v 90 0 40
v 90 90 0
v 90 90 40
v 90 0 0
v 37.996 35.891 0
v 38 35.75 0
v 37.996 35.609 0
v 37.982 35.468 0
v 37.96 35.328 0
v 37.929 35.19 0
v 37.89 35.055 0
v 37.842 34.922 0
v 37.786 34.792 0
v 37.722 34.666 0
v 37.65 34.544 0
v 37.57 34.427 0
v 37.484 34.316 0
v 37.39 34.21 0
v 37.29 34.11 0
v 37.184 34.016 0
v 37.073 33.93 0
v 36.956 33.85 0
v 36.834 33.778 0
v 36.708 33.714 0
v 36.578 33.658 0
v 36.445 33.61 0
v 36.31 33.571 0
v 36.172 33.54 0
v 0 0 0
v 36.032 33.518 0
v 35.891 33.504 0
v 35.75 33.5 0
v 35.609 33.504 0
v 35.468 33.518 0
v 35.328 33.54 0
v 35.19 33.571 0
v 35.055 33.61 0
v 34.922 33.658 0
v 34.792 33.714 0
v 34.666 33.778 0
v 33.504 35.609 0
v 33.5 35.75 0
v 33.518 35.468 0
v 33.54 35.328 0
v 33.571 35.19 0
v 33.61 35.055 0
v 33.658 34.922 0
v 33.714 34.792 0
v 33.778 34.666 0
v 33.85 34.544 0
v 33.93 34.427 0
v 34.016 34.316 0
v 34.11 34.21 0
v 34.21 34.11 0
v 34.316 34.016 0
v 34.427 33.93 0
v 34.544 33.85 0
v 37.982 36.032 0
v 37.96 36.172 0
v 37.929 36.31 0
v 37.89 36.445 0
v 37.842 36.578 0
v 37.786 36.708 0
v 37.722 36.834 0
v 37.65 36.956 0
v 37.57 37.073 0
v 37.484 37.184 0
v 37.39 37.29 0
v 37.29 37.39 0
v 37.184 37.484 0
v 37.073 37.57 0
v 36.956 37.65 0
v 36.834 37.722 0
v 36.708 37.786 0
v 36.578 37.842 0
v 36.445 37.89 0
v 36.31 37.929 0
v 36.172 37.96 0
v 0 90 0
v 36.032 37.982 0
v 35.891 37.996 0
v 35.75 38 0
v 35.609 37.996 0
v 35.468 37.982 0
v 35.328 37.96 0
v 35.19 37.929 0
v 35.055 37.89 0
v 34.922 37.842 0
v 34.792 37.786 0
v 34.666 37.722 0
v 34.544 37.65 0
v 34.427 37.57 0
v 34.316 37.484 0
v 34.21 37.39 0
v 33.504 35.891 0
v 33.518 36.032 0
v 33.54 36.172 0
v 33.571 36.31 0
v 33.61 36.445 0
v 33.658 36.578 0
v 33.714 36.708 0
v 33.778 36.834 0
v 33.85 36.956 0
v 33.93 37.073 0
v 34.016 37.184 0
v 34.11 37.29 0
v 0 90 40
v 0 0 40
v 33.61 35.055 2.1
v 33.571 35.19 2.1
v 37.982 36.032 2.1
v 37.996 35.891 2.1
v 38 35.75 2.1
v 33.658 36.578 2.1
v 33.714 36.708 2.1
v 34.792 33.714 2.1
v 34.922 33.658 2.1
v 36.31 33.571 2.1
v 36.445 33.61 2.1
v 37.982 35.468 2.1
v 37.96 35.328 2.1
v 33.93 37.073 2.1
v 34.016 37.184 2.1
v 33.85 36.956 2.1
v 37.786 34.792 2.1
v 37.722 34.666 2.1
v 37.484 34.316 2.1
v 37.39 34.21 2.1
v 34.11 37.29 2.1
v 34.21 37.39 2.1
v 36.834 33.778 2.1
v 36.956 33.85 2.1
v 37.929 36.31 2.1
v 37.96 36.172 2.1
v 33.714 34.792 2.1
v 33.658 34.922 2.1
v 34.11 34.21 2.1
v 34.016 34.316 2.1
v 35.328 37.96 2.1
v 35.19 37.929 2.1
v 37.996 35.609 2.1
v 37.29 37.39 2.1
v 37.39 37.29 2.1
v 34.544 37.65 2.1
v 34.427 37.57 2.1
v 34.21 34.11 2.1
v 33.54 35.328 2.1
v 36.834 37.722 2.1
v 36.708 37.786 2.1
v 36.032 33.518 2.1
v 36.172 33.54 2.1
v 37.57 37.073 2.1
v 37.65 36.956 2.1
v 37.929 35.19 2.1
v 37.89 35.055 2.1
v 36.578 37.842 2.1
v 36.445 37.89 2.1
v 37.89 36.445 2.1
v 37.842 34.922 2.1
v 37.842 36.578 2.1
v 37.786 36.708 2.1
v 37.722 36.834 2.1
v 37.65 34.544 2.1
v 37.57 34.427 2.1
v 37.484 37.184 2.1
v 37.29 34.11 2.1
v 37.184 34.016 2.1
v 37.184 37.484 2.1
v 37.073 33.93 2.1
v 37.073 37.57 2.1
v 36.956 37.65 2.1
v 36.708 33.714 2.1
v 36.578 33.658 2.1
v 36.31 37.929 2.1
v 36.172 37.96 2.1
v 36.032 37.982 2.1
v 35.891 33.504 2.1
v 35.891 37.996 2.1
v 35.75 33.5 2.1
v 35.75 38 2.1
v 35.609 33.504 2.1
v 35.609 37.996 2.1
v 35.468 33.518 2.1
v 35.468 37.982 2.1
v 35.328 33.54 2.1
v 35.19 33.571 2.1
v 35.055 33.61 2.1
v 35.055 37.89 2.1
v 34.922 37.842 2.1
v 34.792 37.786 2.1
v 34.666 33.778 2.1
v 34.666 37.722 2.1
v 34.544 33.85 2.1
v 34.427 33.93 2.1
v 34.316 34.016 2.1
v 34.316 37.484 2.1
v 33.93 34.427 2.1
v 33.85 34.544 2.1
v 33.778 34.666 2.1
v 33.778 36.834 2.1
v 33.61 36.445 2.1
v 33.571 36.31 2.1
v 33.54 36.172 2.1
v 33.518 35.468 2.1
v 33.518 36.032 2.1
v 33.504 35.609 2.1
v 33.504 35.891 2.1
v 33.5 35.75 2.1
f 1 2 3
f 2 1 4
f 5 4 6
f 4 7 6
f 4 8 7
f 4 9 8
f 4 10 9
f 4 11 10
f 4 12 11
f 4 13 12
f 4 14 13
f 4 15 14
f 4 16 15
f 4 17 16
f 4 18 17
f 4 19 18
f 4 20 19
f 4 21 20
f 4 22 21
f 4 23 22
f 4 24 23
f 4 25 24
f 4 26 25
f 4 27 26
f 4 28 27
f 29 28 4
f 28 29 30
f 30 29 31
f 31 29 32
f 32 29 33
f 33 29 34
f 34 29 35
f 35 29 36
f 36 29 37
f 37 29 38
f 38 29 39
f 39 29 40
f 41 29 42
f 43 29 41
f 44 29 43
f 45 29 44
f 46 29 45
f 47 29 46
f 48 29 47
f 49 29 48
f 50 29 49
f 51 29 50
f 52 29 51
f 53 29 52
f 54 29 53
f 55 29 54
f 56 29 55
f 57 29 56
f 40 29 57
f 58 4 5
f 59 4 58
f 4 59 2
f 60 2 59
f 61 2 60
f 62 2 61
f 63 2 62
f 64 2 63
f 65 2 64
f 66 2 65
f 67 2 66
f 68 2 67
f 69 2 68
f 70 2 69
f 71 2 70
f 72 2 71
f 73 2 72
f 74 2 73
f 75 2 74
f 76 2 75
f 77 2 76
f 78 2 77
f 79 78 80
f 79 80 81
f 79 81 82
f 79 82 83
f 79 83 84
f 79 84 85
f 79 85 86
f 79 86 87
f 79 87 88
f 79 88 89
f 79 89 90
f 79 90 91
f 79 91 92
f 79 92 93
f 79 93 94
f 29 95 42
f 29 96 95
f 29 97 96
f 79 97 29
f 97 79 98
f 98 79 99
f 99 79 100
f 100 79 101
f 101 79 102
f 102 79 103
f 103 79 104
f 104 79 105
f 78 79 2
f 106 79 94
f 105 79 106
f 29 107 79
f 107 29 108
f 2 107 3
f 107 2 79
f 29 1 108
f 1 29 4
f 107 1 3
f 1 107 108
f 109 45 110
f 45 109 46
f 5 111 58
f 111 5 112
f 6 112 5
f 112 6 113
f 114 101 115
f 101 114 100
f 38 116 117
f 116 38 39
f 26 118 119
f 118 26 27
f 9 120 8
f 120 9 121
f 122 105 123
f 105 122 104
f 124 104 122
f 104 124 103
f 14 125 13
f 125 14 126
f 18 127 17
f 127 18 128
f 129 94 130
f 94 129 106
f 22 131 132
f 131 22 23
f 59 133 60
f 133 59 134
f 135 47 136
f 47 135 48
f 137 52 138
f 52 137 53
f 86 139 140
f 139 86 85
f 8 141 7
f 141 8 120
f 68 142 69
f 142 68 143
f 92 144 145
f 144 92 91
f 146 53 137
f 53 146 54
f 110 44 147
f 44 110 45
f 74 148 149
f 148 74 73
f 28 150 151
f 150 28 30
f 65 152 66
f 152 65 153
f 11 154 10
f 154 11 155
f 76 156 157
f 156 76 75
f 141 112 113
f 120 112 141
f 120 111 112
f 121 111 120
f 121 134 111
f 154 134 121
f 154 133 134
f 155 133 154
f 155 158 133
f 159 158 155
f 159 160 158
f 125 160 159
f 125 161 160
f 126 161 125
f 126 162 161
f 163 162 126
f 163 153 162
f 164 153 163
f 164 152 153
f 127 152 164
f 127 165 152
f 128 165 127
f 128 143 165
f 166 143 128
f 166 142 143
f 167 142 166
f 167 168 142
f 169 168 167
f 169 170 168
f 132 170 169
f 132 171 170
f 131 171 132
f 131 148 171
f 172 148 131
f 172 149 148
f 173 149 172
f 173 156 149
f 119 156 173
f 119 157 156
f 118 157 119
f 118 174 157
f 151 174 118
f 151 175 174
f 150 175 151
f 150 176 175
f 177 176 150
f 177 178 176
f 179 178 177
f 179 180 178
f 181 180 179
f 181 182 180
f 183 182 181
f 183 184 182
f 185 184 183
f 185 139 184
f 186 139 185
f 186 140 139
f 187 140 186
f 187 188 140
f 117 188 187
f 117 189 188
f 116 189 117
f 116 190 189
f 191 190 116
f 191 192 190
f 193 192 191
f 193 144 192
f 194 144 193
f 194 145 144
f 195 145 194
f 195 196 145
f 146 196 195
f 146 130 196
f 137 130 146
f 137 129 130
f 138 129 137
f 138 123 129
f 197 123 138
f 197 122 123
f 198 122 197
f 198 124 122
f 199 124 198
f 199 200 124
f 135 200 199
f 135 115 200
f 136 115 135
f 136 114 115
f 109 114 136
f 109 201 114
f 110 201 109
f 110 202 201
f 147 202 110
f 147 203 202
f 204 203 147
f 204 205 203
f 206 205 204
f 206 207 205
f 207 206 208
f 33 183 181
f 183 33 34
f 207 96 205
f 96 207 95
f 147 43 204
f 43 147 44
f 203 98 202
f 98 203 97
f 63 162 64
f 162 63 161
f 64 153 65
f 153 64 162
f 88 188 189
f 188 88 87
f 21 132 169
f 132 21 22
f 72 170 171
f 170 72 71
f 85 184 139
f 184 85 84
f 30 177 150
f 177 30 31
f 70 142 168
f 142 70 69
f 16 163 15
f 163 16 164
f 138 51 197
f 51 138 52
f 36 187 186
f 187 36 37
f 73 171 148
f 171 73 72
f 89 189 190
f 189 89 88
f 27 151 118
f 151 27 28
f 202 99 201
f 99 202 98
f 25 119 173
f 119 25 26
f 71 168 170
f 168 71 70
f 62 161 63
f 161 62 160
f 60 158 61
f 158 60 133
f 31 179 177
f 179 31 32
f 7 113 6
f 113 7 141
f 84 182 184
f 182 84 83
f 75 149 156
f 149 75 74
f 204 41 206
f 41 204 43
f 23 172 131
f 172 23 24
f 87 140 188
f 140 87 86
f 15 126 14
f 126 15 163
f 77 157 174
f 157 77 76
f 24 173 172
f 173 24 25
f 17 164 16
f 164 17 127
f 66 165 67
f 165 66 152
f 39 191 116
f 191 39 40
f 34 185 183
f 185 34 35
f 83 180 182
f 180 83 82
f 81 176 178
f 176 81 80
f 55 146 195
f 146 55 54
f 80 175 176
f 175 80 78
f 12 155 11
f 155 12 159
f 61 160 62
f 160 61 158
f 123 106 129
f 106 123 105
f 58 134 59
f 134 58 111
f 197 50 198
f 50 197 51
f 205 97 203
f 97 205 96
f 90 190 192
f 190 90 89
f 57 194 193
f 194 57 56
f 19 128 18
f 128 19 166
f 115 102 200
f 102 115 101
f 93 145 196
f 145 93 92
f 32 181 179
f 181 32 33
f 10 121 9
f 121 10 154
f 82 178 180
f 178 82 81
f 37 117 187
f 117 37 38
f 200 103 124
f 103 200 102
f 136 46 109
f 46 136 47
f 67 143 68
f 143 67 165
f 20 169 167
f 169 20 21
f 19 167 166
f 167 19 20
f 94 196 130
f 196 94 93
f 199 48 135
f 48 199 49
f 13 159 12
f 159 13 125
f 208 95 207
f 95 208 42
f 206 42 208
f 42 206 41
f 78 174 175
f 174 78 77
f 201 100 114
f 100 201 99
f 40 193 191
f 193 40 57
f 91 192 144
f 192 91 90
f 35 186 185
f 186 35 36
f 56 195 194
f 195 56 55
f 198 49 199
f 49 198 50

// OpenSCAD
// DIY Magnetic Stirrer Housing for 80mm PC Fan
// Print Orientation: Upside down. Top plate on bed (Z=0). Walls rise to Z=40.

// --- Dimensions ---
// Outer dimensions of the housing
W_OUT = 90;
H_OUT = 90;
D_OUT = 90; // Depth (Z height of walls)

// Wall thickness
W_THICK = 2.5;

// Top plate thickness
TOP_THICK = 2;

// Total height of the box (top of walls)
BOX_HEIGHT = 40;

// Fan mounting hole pattern
// 71.5 mm square pattern centred on the plate
HOLE_PITCH = 71.5;
// Hole diameter for M4 screws
HOLE_DIAM = 4.5;

// Cable notch dimensions
NOTCH_WIDTH = 12;
NOTCH_DEPTH = 8; // Reaches 8mm down from open edge (Z=32 to Z=40)

// --- Configuration ---
$fn = 100; // High resolution for smooth curves and precise holes

// --- Main Body Construction ---
difference() {
    union() {
        // --- 1. The Top Plate ---
        // Lies on the bed, Z=0 to Z=TOP_THICK
        translate([0, 0, 0])
            cube([W_OUT, H_OUT, TOP_THICK]);

        // --- 2. The Walls ---
        // Rise from Z=TOP_THICK to Z=BOX_HEIGHT
        // We construct the outer shell and subtract the inner void to create walls
        translate([0, 0, TOP_THICK])
            cube([W_OUT, H_OUT, BOX_HEIGHT - TOP_THICK]);
        
        // Create the inner void for the walls
        // Inner dimensions: Outer - 2*Thickness
        W_IN = W_OUT - (2 * W_THICK);
        H_IN = H_OUT - (2 * W_THICK);
        
        translate([W_THICK, W_THICK, TOP_THICK])
            cube([W_IN, H_IN, BOX_HEIGHT - TOP_THICK]);
    }
    
    // --- 3. Cutouts ---
    
    // A. Fan Mounting Holes
    // 4 holes on a 71.5mm square pattern, centred on the plate.
    // Pattern corners at +/- 35.75mm.
    // Hole centers: (35.75, 35.75), (-35.75, 35.75), (-35.75, -35.75), (35.75, -35.75)
    
    // Define hole positions explicitly to avoid scope issues
    hole_positions = [
        [HOLE_PITCH/2, HOLE_PITCH/2],
        [-HOLE_PITCH/2, HOLE_PITCH/2],
        [-HOLE_PITCH/2, -HOLE_PITCH/2],
        [HOLE_PITCH/2, -HOLE_PITCH/2]
    ];
    
    for (p = hole_positions) {
        translate(p)
            cylinder(h = TOP_THICK + 0.1, r = HOLE_DIAM/2); // +0.1 to ensure clean cut through the plate
    }

    // B. Cable Notch
    // In one wall, cut a notch.
    // 12 mm wide, centred along the wall.
    // Reaching 8 mm down from the open edge (Z=32 to Z=40).
    // Let's place this notch in the wall at Y = -H_OUT/2 + W_THICK (the front wall).
    // Notch width: 12mm. Centered along the wall (X-axis).
    // Wall X range: -45 to 45. Center is 0.
    // Notch X range: -6 to +6.
    
    // Position: Front wall (Y = -H_OUT/2 + W_THICK)
    // Depth into wall: Notch width / 2 = 6mm.
    // Height: From Z=32 to Z=40.
    
    translate([0, -H_OUT/2 + W_THICK, 32])
        cube([NOTCH_WIDTH, W_THICK, NOTCH_DEPTH]);
}
